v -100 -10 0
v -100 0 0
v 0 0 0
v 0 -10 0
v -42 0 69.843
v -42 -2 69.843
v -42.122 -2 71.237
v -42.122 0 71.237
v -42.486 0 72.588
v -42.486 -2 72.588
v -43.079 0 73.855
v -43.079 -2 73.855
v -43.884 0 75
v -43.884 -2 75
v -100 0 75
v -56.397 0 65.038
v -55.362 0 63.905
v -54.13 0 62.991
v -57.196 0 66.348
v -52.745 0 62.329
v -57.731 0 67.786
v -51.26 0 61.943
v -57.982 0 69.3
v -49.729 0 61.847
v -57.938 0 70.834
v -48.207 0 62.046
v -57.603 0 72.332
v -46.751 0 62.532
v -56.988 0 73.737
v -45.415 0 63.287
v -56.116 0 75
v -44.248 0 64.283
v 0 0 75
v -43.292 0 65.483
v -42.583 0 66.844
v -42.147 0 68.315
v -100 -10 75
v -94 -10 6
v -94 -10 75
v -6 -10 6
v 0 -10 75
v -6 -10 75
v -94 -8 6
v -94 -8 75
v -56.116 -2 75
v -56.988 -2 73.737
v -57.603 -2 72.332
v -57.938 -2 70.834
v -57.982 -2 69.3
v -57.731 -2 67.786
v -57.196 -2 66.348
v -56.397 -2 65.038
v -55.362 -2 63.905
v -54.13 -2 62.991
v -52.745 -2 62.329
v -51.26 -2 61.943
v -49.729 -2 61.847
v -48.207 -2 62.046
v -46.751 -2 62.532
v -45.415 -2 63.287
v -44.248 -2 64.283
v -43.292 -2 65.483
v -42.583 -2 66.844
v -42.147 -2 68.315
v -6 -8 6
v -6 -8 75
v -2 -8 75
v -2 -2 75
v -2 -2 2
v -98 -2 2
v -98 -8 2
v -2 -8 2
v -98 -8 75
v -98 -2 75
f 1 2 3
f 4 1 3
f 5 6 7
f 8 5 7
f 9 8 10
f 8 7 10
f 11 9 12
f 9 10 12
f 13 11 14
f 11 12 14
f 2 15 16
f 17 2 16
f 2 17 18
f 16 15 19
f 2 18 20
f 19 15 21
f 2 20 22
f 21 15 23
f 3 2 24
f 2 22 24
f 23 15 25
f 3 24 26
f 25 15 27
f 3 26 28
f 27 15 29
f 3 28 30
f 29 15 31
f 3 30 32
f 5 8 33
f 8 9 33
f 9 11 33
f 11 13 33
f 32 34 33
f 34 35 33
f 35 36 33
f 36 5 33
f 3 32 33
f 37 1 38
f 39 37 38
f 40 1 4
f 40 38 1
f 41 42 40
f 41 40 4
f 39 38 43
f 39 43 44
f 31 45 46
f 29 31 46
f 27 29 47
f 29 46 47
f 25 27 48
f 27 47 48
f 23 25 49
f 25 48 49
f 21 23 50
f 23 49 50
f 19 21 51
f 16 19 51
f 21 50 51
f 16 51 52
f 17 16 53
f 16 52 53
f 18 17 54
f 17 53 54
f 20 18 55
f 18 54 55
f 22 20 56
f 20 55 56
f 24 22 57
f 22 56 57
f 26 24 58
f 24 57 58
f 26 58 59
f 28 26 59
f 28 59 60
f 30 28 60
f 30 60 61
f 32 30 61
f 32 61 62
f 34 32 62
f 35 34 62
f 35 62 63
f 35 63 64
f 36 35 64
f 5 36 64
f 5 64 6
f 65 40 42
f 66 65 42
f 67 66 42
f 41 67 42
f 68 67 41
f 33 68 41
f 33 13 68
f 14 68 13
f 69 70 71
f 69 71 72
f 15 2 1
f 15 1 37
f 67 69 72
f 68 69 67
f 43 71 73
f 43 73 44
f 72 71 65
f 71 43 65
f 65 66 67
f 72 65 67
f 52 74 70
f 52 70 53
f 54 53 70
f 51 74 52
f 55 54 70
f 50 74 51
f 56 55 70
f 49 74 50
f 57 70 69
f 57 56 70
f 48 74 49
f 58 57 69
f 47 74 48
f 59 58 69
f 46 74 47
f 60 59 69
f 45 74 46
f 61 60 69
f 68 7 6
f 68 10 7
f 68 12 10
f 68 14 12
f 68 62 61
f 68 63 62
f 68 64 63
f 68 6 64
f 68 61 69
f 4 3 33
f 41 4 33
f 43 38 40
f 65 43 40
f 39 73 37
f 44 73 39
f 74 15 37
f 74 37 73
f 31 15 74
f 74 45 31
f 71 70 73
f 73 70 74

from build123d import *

# Parameters (mm, degrees)
F0_W     = 100
F0_H     = 75
F1_DEPTH = 10
F2_T     = -2
F3_W     = 88
F3_H     = 69
F4_DEPTH = 5
F6_DEPTH = 10.001


with BuildPart() as f1:
    # F0 (on Front) → F1 (new body)
    with BuildSketch(Plane.XZ):
        with Locations((-50, 37.5)):
            Rectangle(F0_W, F0_H)
    extrude(amount=F1_DEPTH)

    # F2
    f2_openings = [f1.faces().sort_by_distance(p)[0] for p in [
        (-50, -5, 75),
    ]]
    offset(amount=F2_T, openings=f2_openings)

    # F3 (on face) → F4 (cut)
    with BuildSketch(Plane.XZ.offset(10)):
        with Locations((-50, 40.5)):
            Rectangle(F3_W, F3_H)
    extrude(amount=-F4_DEPTH, mode=Mode.SUBTRACT)

    # F5 (on face) → F6 (cut, through all)
    with BuildSketch(Plane.XZ.offset(10)):
        with BuildLine():
            ThreePointArc((-56.115779, 75), (-52.745338, 62.328554), (-42, 69.842748))
            ThreePointArc((-42, 69.842748), (-42.485806, 72.588087), (-43.884221, 75))
            Line((-43.884221, 75), (-56.115779, 75))
        make_face()
    extrude(amount=-F6_DEPTH, mode=Mode.SUBTRACT)


solid = f1.part
